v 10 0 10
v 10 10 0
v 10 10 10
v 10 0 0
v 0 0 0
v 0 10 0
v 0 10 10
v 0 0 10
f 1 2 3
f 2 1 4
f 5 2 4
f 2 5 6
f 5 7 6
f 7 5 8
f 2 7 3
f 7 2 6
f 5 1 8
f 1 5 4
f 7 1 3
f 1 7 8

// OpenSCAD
// A parametric two-color cube for testing multicolor re-render.
// Two stacked boxes: red (bottom) and blue (top).

// BEGIN_PARAMS
// Size of the cube in mm
size = 10;


// Height multiplier
height_factor = 1;
// END_PARAMS

h = size * height_factor;

color("red") cube([size, size, h / 2]);
color("blue") translate([0, 0, h / 2]) cube([size, size, h / 2]);
